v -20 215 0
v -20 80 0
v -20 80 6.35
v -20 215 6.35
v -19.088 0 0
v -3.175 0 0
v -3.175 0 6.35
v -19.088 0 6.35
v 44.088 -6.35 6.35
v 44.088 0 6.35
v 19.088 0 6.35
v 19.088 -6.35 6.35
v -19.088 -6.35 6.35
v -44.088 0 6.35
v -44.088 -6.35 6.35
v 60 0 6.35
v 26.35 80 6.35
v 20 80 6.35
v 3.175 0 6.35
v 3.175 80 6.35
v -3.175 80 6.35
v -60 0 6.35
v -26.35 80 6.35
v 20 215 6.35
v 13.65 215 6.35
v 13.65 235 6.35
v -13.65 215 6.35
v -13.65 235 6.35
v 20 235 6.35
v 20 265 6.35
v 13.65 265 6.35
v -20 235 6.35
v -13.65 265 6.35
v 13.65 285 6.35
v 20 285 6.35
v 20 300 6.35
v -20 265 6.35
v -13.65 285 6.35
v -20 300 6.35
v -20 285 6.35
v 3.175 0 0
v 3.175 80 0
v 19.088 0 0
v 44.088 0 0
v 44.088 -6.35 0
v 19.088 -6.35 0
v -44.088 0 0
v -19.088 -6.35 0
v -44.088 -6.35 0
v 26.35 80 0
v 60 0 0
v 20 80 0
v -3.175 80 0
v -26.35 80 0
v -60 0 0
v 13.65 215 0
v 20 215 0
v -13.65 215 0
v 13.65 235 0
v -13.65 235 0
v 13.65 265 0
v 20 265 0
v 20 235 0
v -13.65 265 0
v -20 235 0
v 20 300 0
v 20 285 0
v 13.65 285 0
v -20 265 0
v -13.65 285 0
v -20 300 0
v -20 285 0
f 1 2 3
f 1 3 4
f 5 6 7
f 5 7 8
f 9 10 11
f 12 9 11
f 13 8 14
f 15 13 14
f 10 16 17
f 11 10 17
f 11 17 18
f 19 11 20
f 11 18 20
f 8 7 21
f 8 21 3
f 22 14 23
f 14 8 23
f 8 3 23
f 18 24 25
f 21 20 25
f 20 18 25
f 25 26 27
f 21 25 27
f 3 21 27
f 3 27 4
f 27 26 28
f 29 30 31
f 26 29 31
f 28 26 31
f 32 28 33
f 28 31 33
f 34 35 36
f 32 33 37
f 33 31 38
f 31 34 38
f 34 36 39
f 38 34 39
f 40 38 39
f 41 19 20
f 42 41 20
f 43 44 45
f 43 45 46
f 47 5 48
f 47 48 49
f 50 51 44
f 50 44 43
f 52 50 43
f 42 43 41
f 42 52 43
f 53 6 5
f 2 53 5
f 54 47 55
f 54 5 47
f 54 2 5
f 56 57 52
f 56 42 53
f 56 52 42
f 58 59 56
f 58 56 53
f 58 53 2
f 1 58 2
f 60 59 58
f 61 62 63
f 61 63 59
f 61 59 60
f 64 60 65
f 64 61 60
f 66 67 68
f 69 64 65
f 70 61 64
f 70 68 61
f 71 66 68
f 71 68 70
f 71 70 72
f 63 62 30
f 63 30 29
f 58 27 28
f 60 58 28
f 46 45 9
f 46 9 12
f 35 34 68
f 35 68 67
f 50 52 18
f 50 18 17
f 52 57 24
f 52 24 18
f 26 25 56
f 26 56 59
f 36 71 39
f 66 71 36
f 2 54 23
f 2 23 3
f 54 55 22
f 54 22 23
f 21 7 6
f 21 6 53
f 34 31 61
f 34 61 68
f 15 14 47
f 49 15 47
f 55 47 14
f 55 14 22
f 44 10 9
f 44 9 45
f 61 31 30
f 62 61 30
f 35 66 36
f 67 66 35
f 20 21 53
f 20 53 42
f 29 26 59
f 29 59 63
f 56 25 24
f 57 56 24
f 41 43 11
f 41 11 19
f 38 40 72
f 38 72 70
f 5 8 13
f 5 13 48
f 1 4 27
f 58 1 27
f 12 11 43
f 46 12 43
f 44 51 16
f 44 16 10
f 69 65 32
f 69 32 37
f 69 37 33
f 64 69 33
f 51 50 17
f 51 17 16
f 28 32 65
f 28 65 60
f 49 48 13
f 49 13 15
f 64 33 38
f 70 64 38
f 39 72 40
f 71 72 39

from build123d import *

# Parameters (mm, degrees)
BOSS_EXTRU_1_DEPTH      = 6.35
ENL_V_MAT_EXTRU_1_REACH = 308.007
ESQUISSE2_W             = 6.35
ESQUISSE2_H             = 80
ENL_V_MAT_EXTRU_2_REACH = 308.007
ESQUISSE4_W             = 6.35
ESQUISSE4_H             = 20
SKETCH2_W               = 25
SKETCH2_H               = 6.35
BOSS_EXTRUDE2_DEPTH     = 6.35


with BuildPart() as part:
    # Esquisse1 → Boss.-Extru.1 (new body)
    with BuildSketch(Plane.XY):
        Polygon((-20, 300), (20, 300), (20, 80), (26.35, 80), (60, 0), (-60, 0), (-26.35, 80), (-20, 80), align=None)
    extrude(amount=BOSS_EXTRU_1_DEPTH)

    # Esquisse2 → Enlèv. mat.-Extru.1 (cut, up to next)
    with BuildSketch(Plane.XY.offset(6.35), mode=Mode.PRIVATE) as enl_v_mat_extru_1_sk1:
        with Locations((0, 40)):
            Rectangle(ESQUISSE2_W, ESQUISSE2_H)
    enl_v_mat_extru_1_tool1 = extrude(enl_v_mat_extru_1_sk1.sketch, amount=-ENL_V_MAT_EXTRU_1_REACH, mode=Mode.PRIVATE) & part.part
    add(enl_v_mat_extru_1_tool1.solids().sort_by_distance((0, 40, 6.35))[0], mode=Mode.SUBTRACT)

    # Esquisse4 → Enlèv. mat.-Extru.2 (cut, up to next)
    with BuildSketch(Plane.XY.offset(6.35), mode=Mode.PRIVATE) as enl_v_mat_extru_2_sk1:
        with Locations((16.825, 225)):
            Rectangle(ESQUISSE4_W, ESQUISSE4_H)
    enl_v_mat_extru_2_tool1 = extrude(enl_v_mat_extru_2_sk1.sketch, amount=-ENL_V_MAT_EXTRU_2_REACH, mode=Mode.PRIVATE) & part.part
    # Esquisse4 → Enlèv. mat.-Extru.2 (cut, up to next)
    with BuildSketch(Plane.XY.offset(6.35), mode=Mode.PRIVATE) as enl_v_mat_extru_2_sk2:
        with Locations((-16.825, 225)):
            Rectangle(ESQUISSE4_W, ESQUISSE4_H)
    enl_v_mat_extru_2_tool2 = extrude(enl_v_mat_extru_2_sk2.sketch, amount=-ENL_V_MAT_EXTRU_2_REACH, mode=Mode.PRIVATE) & part.part
    # Esquisse4 → Enlèv. mat.-Extru.2 (cut, up to next)
    with BuildSketch(Plane.XY.offset(6.35), mode=Mode.PRIVATE) as enl_v_mat_extru_2_sk3:
        with Locations((-16.825, 275)):
            Rectangle(ESQUISSE4_W, ESQUISSE4_H)
    enl_v_mat_extru_2_tool3 = extrude(enl_v_mat_extru_2_sk3.sketch, amount=-ENL_V_MAT_EXTRU_2_REACH, mode=Mode.PRIVATE) & part.part
    # Esquisse4 → Enlèv. mat.-Extru.2 (cut, up to next)
    with BuildSketch(Plane.XY.offset(6.35), mode=Mode.PRIVATE) as enl_v_mat_extru_2_sk4:
        with Locations((16.825, 275)):
            Rectangle(ESQUISSE4_W, ESQUISSE4_H)
    enl_v_mat_extru_2_tool4 = extrude(enl_v_mat_extru_2_sk4.sketch, amount=-ENL_V_MAT_EXTRU_2_REACH, mode=Mode.PRIVATE) & part.part
    add(enl_v_mat_extru_2_tool1.solids().sort_by_distance((16.825, 225, 6.35))[0], mode=Mode.SUBTRACT)
    add(enl_v_mat_extru_2_tool2.solids().sort_by_distance((-16.825, 225, 6.35))[0], mode=Mode.SUBTRACT)
    add(enl_v_mat_extru_2_tool3.solids().sort_by_distance((-16.825, 275, 6.35))[0], mode=Mode.SUBTRACT)
    add(enl_v_mat_extru_2_tool4.solids().sort_by_distance((16.825, 275, 6.35))[0], mode=Mode.SUBTRACT)

    # Sketch2 → Boss-Extrude2 (add)
    with BuildSketch(Plane(origin=(0, 0, 0), x_dir=(-1, 0, 0), z_dir=(0, -1, 0))):
        with Locations((31.5875, -3.175)):
            Rectangle(SKETCH2_W, SKETCH2_H)
        with Locations((-31.5875, -3.175)):
            Rectangle(SKETCH2_W, SKETCH2_H)
    extrude(amount=BOSS_EXTRUDE2_DEPTH)


solid = part.part
